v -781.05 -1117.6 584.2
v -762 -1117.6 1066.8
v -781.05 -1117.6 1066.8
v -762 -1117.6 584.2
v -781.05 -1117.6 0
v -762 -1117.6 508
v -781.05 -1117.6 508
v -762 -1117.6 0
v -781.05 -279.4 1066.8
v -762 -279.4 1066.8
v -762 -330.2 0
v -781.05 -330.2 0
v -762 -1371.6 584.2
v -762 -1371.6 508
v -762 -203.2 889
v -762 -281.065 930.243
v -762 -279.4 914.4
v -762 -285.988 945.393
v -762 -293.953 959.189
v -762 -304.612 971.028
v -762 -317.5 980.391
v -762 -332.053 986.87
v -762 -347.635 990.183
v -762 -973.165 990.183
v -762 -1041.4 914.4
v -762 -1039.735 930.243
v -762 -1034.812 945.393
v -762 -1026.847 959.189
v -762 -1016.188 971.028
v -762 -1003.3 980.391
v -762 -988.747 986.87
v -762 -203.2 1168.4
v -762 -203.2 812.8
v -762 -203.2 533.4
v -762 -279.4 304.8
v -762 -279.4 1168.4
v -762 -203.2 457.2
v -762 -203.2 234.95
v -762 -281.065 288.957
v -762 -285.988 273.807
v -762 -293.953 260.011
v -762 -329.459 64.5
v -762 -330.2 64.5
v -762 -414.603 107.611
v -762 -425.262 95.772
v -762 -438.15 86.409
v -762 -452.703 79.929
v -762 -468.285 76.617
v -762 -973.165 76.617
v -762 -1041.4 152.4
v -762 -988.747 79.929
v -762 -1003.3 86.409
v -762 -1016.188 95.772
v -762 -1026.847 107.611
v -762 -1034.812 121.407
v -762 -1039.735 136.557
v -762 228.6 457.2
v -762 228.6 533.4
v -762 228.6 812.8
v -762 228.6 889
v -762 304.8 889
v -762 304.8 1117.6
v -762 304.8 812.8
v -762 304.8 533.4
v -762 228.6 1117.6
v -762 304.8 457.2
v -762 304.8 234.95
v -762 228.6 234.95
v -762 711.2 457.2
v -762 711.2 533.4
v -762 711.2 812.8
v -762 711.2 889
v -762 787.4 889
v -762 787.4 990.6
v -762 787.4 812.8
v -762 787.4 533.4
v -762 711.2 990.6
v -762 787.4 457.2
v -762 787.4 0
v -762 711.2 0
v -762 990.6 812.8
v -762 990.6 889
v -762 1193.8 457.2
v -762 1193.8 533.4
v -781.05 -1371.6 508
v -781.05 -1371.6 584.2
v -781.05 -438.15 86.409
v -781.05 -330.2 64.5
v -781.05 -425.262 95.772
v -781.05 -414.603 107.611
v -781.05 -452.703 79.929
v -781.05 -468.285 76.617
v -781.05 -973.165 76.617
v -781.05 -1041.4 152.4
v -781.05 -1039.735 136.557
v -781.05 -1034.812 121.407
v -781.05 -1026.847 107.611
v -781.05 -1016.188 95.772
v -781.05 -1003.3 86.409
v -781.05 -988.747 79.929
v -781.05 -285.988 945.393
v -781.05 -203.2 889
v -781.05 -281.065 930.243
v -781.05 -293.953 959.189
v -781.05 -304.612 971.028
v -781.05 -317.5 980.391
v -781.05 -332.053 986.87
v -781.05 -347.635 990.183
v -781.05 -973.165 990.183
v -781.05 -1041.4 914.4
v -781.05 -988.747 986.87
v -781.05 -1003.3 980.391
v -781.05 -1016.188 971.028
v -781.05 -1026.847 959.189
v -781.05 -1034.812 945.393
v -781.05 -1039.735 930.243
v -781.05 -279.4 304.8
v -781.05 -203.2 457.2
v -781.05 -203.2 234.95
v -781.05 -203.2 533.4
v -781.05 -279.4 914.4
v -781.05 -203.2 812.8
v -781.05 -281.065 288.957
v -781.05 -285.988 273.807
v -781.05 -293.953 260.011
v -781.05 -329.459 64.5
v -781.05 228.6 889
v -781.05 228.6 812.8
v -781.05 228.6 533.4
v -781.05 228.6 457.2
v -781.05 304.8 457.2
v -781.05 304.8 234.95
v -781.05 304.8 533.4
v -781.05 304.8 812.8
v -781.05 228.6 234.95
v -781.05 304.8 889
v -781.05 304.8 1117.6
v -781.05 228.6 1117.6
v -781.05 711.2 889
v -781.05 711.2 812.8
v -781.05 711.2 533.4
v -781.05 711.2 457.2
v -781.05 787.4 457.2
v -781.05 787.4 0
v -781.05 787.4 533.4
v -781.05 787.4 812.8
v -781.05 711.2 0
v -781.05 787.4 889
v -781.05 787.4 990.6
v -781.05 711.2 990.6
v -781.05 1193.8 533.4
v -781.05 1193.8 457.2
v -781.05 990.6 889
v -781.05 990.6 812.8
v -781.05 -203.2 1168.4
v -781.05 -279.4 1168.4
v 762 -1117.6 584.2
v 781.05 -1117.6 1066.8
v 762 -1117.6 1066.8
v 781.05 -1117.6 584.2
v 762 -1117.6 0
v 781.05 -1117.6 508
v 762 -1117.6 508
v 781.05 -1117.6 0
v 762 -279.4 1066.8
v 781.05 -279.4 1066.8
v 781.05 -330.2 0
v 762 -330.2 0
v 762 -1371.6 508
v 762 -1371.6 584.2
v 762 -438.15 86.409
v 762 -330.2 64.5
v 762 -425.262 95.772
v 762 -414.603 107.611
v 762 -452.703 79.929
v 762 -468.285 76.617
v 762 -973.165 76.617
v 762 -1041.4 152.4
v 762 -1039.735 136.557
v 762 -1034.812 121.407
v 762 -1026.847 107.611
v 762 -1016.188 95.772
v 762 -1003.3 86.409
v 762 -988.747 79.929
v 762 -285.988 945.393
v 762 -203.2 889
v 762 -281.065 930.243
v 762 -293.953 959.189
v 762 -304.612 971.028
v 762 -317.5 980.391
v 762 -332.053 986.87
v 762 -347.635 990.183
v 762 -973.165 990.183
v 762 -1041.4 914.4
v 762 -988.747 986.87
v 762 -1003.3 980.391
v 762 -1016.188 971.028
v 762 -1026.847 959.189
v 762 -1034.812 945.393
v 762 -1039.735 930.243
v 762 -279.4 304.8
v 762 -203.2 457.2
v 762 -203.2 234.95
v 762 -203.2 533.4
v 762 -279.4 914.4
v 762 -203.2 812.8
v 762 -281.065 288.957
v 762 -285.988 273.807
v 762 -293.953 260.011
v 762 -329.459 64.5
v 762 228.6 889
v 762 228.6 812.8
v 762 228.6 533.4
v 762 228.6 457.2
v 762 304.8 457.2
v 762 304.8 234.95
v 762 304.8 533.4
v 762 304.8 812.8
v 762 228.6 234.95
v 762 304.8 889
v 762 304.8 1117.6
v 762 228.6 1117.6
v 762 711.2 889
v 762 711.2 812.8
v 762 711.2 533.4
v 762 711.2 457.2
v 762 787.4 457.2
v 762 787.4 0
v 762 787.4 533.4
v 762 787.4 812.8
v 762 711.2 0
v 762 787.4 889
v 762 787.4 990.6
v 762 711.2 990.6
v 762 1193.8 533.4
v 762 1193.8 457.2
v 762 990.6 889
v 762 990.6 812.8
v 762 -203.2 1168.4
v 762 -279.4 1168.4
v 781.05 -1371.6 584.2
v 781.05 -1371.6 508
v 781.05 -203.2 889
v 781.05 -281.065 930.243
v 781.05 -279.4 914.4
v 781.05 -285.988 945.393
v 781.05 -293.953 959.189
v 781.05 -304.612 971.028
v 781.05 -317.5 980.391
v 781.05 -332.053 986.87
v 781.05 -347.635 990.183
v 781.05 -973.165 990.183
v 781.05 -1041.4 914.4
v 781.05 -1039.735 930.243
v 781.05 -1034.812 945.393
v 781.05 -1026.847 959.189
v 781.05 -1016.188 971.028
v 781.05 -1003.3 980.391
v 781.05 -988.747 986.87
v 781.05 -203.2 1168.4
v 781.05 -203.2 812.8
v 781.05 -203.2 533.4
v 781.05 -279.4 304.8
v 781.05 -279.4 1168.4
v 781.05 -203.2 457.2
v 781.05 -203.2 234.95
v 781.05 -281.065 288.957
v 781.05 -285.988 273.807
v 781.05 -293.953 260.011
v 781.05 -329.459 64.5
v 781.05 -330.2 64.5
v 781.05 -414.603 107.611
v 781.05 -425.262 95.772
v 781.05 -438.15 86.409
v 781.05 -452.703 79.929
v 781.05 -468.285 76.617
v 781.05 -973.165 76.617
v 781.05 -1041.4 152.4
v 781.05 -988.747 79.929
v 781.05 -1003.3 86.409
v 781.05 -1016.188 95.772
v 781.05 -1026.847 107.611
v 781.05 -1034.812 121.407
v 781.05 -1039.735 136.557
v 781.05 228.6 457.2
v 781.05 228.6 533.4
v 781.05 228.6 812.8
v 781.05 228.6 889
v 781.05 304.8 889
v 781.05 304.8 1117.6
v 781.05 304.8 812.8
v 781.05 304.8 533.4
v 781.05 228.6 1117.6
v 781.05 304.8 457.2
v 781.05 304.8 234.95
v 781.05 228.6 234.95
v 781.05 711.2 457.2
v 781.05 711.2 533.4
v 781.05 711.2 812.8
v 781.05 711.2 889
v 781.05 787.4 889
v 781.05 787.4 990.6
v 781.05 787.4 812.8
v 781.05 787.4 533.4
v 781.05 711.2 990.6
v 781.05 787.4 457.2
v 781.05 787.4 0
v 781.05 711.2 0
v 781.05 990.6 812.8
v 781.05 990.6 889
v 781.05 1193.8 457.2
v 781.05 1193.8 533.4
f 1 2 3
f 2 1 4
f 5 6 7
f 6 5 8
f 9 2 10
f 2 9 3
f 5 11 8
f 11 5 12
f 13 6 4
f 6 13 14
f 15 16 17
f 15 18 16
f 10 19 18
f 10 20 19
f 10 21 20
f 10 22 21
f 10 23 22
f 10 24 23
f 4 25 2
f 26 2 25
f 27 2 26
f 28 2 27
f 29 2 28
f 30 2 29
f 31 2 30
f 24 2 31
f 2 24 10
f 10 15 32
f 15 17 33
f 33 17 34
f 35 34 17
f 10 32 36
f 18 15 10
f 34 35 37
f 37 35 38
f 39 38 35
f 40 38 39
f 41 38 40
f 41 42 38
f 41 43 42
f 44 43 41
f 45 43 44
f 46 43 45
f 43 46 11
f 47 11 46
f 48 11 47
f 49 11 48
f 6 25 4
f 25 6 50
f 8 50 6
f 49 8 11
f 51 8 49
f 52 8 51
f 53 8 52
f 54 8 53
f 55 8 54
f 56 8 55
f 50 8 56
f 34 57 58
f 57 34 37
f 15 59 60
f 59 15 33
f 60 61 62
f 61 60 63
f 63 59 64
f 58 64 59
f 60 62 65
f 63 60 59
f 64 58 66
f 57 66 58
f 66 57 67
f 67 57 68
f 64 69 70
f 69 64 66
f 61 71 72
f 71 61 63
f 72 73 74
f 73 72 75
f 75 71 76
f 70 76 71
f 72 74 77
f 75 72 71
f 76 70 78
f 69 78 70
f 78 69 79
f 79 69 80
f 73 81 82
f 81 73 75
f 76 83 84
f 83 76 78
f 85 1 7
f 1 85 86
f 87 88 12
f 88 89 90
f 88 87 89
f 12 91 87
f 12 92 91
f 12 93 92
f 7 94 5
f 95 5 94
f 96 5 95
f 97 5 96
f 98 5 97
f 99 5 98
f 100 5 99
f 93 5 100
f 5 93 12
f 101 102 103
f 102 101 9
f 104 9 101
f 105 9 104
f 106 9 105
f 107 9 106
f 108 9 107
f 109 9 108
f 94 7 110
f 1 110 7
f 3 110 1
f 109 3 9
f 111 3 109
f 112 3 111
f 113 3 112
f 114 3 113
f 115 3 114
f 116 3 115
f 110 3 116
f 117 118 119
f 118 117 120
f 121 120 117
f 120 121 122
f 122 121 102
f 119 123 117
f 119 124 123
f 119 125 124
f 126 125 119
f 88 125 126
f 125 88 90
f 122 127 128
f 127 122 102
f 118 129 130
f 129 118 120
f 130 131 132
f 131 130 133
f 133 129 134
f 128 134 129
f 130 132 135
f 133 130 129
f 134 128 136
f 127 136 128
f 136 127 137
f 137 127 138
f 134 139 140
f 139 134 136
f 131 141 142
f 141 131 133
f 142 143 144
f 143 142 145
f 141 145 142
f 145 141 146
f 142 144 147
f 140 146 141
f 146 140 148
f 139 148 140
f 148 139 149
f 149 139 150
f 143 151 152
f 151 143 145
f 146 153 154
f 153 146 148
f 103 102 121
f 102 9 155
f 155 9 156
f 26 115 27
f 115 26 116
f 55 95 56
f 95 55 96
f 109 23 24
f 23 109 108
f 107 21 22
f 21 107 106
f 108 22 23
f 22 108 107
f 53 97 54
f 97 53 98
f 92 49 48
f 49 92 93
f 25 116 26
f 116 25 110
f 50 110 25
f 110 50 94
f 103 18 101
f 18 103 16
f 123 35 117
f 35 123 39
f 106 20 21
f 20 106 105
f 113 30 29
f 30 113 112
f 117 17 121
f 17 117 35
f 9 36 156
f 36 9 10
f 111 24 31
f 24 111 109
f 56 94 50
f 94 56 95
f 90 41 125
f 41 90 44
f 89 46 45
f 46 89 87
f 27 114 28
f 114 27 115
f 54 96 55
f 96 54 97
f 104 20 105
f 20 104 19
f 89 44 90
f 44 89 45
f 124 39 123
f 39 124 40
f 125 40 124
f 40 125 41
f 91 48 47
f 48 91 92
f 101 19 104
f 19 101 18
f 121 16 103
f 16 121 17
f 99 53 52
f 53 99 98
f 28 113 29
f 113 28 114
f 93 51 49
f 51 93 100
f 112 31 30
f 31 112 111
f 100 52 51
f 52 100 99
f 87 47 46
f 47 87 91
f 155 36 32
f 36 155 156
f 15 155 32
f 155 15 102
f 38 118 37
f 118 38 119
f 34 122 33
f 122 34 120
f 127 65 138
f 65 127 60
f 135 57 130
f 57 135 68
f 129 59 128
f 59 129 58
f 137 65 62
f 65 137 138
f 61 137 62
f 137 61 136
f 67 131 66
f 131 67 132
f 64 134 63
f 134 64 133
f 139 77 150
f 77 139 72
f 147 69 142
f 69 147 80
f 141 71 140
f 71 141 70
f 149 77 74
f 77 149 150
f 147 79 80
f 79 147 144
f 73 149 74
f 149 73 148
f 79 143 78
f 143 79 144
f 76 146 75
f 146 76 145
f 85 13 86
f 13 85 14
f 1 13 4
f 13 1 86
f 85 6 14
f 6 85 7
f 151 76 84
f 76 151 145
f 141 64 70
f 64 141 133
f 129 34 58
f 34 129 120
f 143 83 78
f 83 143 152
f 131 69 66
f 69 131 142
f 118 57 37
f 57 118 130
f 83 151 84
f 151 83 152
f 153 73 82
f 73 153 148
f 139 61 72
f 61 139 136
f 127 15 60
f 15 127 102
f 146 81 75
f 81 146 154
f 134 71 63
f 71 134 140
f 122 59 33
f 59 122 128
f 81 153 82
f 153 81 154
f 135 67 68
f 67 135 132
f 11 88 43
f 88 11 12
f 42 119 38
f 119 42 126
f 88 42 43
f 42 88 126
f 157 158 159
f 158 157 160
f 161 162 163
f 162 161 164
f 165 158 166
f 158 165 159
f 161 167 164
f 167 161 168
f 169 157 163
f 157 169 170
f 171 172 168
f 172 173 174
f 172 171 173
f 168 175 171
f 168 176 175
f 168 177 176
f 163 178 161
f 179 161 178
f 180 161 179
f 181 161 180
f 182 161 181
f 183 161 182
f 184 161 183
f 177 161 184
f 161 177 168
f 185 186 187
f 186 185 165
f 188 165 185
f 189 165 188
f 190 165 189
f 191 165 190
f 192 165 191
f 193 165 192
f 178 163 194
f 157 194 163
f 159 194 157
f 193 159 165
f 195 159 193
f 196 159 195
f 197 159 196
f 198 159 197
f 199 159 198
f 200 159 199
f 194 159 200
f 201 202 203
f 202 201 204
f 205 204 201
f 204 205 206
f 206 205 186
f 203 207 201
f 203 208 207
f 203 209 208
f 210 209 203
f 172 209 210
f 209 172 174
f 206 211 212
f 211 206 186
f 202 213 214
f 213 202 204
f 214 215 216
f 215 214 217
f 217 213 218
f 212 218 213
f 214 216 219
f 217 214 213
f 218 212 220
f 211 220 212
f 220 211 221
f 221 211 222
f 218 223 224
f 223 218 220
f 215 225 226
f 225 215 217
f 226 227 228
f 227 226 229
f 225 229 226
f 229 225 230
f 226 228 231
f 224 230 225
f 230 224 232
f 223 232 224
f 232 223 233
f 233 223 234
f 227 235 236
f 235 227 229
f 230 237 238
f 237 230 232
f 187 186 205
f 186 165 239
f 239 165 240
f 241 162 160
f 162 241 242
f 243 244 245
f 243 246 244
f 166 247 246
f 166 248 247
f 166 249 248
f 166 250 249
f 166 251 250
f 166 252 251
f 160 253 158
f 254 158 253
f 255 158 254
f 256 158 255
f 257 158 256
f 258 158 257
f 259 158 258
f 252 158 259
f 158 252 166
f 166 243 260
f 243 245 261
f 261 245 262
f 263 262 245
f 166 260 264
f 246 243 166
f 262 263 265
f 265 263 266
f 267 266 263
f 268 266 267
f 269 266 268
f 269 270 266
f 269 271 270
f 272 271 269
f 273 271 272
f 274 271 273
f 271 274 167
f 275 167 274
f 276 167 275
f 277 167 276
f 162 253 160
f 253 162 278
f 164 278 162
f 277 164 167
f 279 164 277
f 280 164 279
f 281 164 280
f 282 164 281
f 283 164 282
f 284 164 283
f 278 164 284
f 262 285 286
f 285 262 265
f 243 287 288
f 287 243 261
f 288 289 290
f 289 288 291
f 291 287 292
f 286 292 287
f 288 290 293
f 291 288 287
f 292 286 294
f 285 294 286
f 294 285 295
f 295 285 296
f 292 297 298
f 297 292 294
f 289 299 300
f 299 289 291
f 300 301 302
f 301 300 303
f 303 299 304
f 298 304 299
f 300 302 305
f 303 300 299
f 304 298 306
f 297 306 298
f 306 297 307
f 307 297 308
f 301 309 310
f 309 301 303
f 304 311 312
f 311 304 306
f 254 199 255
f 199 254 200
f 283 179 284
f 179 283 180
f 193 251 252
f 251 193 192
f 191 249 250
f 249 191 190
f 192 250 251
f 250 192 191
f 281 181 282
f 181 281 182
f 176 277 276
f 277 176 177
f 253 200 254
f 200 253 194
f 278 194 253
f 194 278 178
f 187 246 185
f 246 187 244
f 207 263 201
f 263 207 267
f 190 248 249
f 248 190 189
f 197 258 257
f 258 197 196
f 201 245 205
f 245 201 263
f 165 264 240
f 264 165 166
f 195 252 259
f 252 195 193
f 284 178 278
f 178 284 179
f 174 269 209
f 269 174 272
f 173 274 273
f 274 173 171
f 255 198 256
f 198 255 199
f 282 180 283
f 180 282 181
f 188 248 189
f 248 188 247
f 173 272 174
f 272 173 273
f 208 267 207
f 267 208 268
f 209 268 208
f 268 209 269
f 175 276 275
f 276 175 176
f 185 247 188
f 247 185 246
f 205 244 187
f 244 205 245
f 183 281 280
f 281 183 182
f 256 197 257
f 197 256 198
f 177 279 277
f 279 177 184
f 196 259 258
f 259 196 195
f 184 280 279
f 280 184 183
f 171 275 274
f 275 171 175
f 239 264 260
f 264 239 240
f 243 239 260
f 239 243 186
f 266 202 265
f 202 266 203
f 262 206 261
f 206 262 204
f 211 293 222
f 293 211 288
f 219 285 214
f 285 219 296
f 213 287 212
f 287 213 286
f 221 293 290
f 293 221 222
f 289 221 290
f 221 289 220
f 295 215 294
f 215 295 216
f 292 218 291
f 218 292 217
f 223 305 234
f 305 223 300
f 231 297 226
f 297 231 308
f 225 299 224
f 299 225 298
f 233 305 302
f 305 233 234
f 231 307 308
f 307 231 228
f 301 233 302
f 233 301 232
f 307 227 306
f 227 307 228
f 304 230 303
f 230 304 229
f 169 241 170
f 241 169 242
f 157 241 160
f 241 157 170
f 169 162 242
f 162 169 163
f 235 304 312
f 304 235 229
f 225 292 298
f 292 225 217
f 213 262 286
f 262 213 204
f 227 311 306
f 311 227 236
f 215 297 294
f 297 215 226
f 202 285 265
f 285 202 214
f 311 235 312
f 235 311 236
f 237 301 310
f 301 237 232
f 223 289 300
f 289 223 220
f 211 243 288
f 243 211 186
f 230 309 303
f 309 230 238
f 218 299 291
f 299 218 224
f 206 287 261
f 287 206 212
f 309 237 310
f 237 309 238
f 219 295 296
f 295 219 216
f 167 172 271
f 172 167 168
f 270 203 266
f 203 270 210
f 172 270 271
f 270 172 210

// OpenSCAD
// file: ../constants/trailer.scad
use <../lib/convert.scad>

FRAME_WIDTH = feet(4);
FRAME_LENGTH = feet(8);
FRAME_THICKNESS = inches(3);
AXEL_OFFSET_Y = inches(6);
// file: ../components/wheel_well.scad
use <../lib/convert.scad>
use <../lib/colors.scad>

wheel_well_top_width = inches(22);
wheel_well_base_width = inches(32);
wheel_well_depth = inches(13);
wheel_well_base_thickness = inches(2.5);
wheel_well_height = inches(6) + wheel_well_base_thickness;


module wheel_well_cutout() {
  translate([0, 0, -1])
  translate([0, wheel_well_base_width / -2, 0])
  cube([wheel_well_depth + 1, wheel_well_base_width, wheel_well_base_thickness + 2]);
}

module wheel_well_shape() {
  color_wood()
  translate([0, wheel_well_base_width / -2, 0])
  hull() {
    translate([0, (wheel_well_base_width - wheel_well_top_width) / 2, wheel_well_height])
      cube([wheel_well_depth, wheel_well_top_width, inches(0.75)]);

    cube([wheel_well_depth, wheel_well_base_width, wheel_well_base_thickness]);
  }
}

module wheel_well_inside() {
  scale_y = (wheel_well_base_width - inches(1.5)) / wheel_well_base_width;
  scale_z = (wheel_well_height - inches(0.75)) / wheel_well_height;

  color_black()
  scale([1, scale_y, scale_z])
    wheel_well_shape();
}

module wheel_well() {
  difference() {
    wheel_well_shape();

    translate([inches(0.75), 0, -1])
      wheel_well_inside();
  }
}

wheel_well();
// file: ../lib/colors.scad
module color_wood() {
  color("#F8D89D")
    children();
}

module color_hdpe() {
  color("#ccd")
    children();
}

module color_steel() {
  color("#888")
    children();
}

module color_white() {
  color("#fafafa")
    children();
}

module color_black() {
  color("#333")
    children();
}

module color_outside() {
  color("#90b0c4")
    children();
}
// file: ../components/teardrop_side.scad
use <../lib/convert.scad>
use <../lib/colors.scad>
use <./wheel_well.scad>
use <./teardrop_ceiling.scad>
include <../constants/trailer.scad>

side_skin_thickness = inches(0.25);
side_frame_thickness = inches(0.75);

wheel_well_x_offset = AXEL_OFFSET_Y + feet(4) + inches(0);

door_width = inches(30);
door_height = inches(36);
door_radius = inches(3);
door_offset = inches(10);

// Fixes for dxf import
bottom_offset = inches(-0.67);
front_offset = feet(-8) + inches(-11.07);
scale_fix = 1.002;

module door_cutout() {
  thickness = inches(3);
  radius_offset = door_radius * 2;

  translate([door_radius, door_radius, -thickness / 2])
  hull() {
    // bottom left, this creates a angled corner to fit the wheelwell
    translate([0, inches(6), 0])
      cylinder(thickness, r1 = door_radius, r2 = door_radius);
    translate([inches(4.75), 0, 0])
      cylinder(thickness, r1 = door_radius, r2 = door_radius);

    // bottom right
    translate([door_width - radius_offset, 0, 0])
      cylinder(thickness, r1 = door_radius, r2 = door_radius);

    // top left
    translate([0, door_height -  radius_offset, 0])
      cylinder(thickness, r1 = door_radius, r2 = door_radius);

    // top right
    translate([door_width -  radius_offset, door_height -  radius_offset, 0])
      cylinder(thickness, r1 = door_radius, r2 = door_radius);
  }
}

module side_extrusion(thickness) {
  translate([front_offset, 0, bottom_offset])
  rotate([90, 0, 0])
  linear_extrude(height = thickness)
  scale([scale_fix, scale_fix])
      import("../../drawings/sidewall.dxf");
}

module outside_side_skin() {
  color_outside()
  difference() {
    side_extrusion(side_skin_thickness);

    // door cut out
    translate([-door_width - door_offset, 0, inches(3)])
    rotate([90, 0, 0])
      door_cutout();

    translate([-wheel_well_x_offset, inches(-3), 0])
    rotate([0, 0, 90])
      wheel_well_shape();

    translate([-wheel_well_x_offset, inches(-3), 0])
    rotate([0, 0, 90])
      wheel_well_cutout();
  }
}

module inside_side_skin() {
  color_wood()
  difference() {
    outside_side_skin();

    // inside 1/4" ply doesnt extend all the way down
    translate([feet(-9), inches(-0.5), inches(-0.5)])
      cube([feet(10), inches(0.75), inches(3)]);

    // Cut out the ceiling
    translate([10, 1, -1])
    scale([1.01, 1, 1.01])
    teardrop_ceiling_half();
  }
}

module side_frame() {
  color_wood()
  difference() {
    union() {
      // outer frame
      difference() {
        side_extrusion(side_frame_thickness);

        translate([inches(-3), inches(0.25), inches(3)])
          scale([0.93, 1, 0.88])
          side_extrusion(side_frame_thickness * 2);

      }

      // door frame
      difference() {
        translate([inches(-32) - door_offset, inches(-0.75), 0])
          cube([inches(35), inches(0.75), inches(42)]);

        translate([-door_width - door_offset, 0, inches(3)])
        rotate([90, 0, 0])
          door_cutout();
      }

      // door virt
      translate([-door_width - door_offset - inches(3), inches(-0.75), 0])
        cube([inches(3), inches(0.75), inches(46)]);

      // first virt
      translate([feet(-5.25), inches(-0.75), 0])
        cube([inches(3), inches(0.75), inches(44)]);

      // second virt
      translate([feet(-6) + inches(-10), inches(-0.75), 0])
        cube([inches(3), inches(0.75), inches(39)]);

      // front horz
      translate([-door_offset + inches(3), inches(-0.75), inches(20)])
        cube([door_offset, inches(0.75), inches(3)]);

      // back lower
      translate([feet(-8) + inches(-2), inches(-0.75), inches(18)])
        cube([feet(4.75), inches(0.75), inches(3)]);

      // back upper
      translate([feet(-7.5), inches(-0.75), inches(32)])
        cube([feet(4), inches(0.75), inches(3)]);
    }

    translate([-wheel_well_x_offset, inches(-3), 0])
    rotate([0, 0, 90])
      wheel_well_shape();

    translate([-wheel_well_x_offset, inches(-3), 0])
    rotate([0, 0, 90])
      wheel_well_cutout();
  }
}


module teardrop_side() {
  union() {
    translate([0, -(side_skin_thickness + side_frame_thickness), 0])
      outside_side_skin();

    translate([0, -side_skin_thickness, 0])
      side_frame();

    inside_side_skin();
  }
}

teardrop_side();
// file: ../components/teardrop_ceiling.scad
use <../lib/convert.scad>

/**
 * TODO:
 * - Make lip over walls
 * - Cutout for stargazer window
 * - Cutout for fan
 * - Make galley door
 */

ceiling_width = feet(5);
ceiling_thickness = inches(1.75);

// Fixes for dxf import
bottom_offset = inches(-0.67);
front_offset = feet(-8) + inches(-11.07);
scale_fix = 1.002;

module teardrop_ceiling_half() {
  cutout_scale = (feet(4) - ceiling_thickness) / feet(4);
  difference() {
    // side shape from dxf
    translate([front_offset, 0, bottom_offset])
    rotate([90, 0, 0])
    linear_extrude(height = ceiling_width / 2)
    scale([scale_fix, scale_fix])
        import("../../drawings/sidewall.dxf");

    // cut out inside
    translate([-ceiling_thickness, 1, -1])
    scale([cutout_scale, 1.1, cutout_scale])
    translate([front_offset, 0, bottom_offset])
    rotate([90, 0, 0])
    linear_extrude(height = ceiling_width / 2)
    scale([scale_fix, scale_fix])
        import("../../drawings/sidewall.dxf");
  }
}

module teardrop_ceiling_galley_cutout() {
  translate([feet(-8) + inches(-12), -(ceiling_width / 2) - 1, inches(-3)])
    cube([inches(30), ceiling_width + 2, feet(4)]);
}

module teardrop_ceiling() {
  difference() {
    union() {
      mirror([0, 1, 0])
        teardrop_ceiling_half();
      teardrop_ceiling_half();
    }

    // cut out galley
    teardrop_ceiling_galley_cutout();
  }
}

teardrop_ceiling();
// file: ../lib/convert.scad
function inches(in) = in * 25.4;
function feet(ft) = inches(ft * 12);
// main file
use <../lib/convert.scad>
use <../components/teardrop_ceiling.scad>
use <../components/teardrop_side.scad>

module passenger_side(door_open = 0) {
  translate([feet(-2.5) + inches(0.25), inches(-51), 0])
  rotate([0, 0, -90])
    teardrop_side(door_open);
}

module driver_side(door_open = 0) {
  mirror([1, 0, 0])
    passenger_side(door_open);
}

module shell(show_ceiling = true, show_sides = true, doors_open = 0) {
  if (show_sides) {
    passenger_side(doors_open);
    driver_side(doors_open);
  }

  if (show_ceiling) {
    translate([0, feet(-3) + inches(-15), 0])
    rotate([0, 0, -90])
      teardrop_ceiling();
  }
}

shell();
